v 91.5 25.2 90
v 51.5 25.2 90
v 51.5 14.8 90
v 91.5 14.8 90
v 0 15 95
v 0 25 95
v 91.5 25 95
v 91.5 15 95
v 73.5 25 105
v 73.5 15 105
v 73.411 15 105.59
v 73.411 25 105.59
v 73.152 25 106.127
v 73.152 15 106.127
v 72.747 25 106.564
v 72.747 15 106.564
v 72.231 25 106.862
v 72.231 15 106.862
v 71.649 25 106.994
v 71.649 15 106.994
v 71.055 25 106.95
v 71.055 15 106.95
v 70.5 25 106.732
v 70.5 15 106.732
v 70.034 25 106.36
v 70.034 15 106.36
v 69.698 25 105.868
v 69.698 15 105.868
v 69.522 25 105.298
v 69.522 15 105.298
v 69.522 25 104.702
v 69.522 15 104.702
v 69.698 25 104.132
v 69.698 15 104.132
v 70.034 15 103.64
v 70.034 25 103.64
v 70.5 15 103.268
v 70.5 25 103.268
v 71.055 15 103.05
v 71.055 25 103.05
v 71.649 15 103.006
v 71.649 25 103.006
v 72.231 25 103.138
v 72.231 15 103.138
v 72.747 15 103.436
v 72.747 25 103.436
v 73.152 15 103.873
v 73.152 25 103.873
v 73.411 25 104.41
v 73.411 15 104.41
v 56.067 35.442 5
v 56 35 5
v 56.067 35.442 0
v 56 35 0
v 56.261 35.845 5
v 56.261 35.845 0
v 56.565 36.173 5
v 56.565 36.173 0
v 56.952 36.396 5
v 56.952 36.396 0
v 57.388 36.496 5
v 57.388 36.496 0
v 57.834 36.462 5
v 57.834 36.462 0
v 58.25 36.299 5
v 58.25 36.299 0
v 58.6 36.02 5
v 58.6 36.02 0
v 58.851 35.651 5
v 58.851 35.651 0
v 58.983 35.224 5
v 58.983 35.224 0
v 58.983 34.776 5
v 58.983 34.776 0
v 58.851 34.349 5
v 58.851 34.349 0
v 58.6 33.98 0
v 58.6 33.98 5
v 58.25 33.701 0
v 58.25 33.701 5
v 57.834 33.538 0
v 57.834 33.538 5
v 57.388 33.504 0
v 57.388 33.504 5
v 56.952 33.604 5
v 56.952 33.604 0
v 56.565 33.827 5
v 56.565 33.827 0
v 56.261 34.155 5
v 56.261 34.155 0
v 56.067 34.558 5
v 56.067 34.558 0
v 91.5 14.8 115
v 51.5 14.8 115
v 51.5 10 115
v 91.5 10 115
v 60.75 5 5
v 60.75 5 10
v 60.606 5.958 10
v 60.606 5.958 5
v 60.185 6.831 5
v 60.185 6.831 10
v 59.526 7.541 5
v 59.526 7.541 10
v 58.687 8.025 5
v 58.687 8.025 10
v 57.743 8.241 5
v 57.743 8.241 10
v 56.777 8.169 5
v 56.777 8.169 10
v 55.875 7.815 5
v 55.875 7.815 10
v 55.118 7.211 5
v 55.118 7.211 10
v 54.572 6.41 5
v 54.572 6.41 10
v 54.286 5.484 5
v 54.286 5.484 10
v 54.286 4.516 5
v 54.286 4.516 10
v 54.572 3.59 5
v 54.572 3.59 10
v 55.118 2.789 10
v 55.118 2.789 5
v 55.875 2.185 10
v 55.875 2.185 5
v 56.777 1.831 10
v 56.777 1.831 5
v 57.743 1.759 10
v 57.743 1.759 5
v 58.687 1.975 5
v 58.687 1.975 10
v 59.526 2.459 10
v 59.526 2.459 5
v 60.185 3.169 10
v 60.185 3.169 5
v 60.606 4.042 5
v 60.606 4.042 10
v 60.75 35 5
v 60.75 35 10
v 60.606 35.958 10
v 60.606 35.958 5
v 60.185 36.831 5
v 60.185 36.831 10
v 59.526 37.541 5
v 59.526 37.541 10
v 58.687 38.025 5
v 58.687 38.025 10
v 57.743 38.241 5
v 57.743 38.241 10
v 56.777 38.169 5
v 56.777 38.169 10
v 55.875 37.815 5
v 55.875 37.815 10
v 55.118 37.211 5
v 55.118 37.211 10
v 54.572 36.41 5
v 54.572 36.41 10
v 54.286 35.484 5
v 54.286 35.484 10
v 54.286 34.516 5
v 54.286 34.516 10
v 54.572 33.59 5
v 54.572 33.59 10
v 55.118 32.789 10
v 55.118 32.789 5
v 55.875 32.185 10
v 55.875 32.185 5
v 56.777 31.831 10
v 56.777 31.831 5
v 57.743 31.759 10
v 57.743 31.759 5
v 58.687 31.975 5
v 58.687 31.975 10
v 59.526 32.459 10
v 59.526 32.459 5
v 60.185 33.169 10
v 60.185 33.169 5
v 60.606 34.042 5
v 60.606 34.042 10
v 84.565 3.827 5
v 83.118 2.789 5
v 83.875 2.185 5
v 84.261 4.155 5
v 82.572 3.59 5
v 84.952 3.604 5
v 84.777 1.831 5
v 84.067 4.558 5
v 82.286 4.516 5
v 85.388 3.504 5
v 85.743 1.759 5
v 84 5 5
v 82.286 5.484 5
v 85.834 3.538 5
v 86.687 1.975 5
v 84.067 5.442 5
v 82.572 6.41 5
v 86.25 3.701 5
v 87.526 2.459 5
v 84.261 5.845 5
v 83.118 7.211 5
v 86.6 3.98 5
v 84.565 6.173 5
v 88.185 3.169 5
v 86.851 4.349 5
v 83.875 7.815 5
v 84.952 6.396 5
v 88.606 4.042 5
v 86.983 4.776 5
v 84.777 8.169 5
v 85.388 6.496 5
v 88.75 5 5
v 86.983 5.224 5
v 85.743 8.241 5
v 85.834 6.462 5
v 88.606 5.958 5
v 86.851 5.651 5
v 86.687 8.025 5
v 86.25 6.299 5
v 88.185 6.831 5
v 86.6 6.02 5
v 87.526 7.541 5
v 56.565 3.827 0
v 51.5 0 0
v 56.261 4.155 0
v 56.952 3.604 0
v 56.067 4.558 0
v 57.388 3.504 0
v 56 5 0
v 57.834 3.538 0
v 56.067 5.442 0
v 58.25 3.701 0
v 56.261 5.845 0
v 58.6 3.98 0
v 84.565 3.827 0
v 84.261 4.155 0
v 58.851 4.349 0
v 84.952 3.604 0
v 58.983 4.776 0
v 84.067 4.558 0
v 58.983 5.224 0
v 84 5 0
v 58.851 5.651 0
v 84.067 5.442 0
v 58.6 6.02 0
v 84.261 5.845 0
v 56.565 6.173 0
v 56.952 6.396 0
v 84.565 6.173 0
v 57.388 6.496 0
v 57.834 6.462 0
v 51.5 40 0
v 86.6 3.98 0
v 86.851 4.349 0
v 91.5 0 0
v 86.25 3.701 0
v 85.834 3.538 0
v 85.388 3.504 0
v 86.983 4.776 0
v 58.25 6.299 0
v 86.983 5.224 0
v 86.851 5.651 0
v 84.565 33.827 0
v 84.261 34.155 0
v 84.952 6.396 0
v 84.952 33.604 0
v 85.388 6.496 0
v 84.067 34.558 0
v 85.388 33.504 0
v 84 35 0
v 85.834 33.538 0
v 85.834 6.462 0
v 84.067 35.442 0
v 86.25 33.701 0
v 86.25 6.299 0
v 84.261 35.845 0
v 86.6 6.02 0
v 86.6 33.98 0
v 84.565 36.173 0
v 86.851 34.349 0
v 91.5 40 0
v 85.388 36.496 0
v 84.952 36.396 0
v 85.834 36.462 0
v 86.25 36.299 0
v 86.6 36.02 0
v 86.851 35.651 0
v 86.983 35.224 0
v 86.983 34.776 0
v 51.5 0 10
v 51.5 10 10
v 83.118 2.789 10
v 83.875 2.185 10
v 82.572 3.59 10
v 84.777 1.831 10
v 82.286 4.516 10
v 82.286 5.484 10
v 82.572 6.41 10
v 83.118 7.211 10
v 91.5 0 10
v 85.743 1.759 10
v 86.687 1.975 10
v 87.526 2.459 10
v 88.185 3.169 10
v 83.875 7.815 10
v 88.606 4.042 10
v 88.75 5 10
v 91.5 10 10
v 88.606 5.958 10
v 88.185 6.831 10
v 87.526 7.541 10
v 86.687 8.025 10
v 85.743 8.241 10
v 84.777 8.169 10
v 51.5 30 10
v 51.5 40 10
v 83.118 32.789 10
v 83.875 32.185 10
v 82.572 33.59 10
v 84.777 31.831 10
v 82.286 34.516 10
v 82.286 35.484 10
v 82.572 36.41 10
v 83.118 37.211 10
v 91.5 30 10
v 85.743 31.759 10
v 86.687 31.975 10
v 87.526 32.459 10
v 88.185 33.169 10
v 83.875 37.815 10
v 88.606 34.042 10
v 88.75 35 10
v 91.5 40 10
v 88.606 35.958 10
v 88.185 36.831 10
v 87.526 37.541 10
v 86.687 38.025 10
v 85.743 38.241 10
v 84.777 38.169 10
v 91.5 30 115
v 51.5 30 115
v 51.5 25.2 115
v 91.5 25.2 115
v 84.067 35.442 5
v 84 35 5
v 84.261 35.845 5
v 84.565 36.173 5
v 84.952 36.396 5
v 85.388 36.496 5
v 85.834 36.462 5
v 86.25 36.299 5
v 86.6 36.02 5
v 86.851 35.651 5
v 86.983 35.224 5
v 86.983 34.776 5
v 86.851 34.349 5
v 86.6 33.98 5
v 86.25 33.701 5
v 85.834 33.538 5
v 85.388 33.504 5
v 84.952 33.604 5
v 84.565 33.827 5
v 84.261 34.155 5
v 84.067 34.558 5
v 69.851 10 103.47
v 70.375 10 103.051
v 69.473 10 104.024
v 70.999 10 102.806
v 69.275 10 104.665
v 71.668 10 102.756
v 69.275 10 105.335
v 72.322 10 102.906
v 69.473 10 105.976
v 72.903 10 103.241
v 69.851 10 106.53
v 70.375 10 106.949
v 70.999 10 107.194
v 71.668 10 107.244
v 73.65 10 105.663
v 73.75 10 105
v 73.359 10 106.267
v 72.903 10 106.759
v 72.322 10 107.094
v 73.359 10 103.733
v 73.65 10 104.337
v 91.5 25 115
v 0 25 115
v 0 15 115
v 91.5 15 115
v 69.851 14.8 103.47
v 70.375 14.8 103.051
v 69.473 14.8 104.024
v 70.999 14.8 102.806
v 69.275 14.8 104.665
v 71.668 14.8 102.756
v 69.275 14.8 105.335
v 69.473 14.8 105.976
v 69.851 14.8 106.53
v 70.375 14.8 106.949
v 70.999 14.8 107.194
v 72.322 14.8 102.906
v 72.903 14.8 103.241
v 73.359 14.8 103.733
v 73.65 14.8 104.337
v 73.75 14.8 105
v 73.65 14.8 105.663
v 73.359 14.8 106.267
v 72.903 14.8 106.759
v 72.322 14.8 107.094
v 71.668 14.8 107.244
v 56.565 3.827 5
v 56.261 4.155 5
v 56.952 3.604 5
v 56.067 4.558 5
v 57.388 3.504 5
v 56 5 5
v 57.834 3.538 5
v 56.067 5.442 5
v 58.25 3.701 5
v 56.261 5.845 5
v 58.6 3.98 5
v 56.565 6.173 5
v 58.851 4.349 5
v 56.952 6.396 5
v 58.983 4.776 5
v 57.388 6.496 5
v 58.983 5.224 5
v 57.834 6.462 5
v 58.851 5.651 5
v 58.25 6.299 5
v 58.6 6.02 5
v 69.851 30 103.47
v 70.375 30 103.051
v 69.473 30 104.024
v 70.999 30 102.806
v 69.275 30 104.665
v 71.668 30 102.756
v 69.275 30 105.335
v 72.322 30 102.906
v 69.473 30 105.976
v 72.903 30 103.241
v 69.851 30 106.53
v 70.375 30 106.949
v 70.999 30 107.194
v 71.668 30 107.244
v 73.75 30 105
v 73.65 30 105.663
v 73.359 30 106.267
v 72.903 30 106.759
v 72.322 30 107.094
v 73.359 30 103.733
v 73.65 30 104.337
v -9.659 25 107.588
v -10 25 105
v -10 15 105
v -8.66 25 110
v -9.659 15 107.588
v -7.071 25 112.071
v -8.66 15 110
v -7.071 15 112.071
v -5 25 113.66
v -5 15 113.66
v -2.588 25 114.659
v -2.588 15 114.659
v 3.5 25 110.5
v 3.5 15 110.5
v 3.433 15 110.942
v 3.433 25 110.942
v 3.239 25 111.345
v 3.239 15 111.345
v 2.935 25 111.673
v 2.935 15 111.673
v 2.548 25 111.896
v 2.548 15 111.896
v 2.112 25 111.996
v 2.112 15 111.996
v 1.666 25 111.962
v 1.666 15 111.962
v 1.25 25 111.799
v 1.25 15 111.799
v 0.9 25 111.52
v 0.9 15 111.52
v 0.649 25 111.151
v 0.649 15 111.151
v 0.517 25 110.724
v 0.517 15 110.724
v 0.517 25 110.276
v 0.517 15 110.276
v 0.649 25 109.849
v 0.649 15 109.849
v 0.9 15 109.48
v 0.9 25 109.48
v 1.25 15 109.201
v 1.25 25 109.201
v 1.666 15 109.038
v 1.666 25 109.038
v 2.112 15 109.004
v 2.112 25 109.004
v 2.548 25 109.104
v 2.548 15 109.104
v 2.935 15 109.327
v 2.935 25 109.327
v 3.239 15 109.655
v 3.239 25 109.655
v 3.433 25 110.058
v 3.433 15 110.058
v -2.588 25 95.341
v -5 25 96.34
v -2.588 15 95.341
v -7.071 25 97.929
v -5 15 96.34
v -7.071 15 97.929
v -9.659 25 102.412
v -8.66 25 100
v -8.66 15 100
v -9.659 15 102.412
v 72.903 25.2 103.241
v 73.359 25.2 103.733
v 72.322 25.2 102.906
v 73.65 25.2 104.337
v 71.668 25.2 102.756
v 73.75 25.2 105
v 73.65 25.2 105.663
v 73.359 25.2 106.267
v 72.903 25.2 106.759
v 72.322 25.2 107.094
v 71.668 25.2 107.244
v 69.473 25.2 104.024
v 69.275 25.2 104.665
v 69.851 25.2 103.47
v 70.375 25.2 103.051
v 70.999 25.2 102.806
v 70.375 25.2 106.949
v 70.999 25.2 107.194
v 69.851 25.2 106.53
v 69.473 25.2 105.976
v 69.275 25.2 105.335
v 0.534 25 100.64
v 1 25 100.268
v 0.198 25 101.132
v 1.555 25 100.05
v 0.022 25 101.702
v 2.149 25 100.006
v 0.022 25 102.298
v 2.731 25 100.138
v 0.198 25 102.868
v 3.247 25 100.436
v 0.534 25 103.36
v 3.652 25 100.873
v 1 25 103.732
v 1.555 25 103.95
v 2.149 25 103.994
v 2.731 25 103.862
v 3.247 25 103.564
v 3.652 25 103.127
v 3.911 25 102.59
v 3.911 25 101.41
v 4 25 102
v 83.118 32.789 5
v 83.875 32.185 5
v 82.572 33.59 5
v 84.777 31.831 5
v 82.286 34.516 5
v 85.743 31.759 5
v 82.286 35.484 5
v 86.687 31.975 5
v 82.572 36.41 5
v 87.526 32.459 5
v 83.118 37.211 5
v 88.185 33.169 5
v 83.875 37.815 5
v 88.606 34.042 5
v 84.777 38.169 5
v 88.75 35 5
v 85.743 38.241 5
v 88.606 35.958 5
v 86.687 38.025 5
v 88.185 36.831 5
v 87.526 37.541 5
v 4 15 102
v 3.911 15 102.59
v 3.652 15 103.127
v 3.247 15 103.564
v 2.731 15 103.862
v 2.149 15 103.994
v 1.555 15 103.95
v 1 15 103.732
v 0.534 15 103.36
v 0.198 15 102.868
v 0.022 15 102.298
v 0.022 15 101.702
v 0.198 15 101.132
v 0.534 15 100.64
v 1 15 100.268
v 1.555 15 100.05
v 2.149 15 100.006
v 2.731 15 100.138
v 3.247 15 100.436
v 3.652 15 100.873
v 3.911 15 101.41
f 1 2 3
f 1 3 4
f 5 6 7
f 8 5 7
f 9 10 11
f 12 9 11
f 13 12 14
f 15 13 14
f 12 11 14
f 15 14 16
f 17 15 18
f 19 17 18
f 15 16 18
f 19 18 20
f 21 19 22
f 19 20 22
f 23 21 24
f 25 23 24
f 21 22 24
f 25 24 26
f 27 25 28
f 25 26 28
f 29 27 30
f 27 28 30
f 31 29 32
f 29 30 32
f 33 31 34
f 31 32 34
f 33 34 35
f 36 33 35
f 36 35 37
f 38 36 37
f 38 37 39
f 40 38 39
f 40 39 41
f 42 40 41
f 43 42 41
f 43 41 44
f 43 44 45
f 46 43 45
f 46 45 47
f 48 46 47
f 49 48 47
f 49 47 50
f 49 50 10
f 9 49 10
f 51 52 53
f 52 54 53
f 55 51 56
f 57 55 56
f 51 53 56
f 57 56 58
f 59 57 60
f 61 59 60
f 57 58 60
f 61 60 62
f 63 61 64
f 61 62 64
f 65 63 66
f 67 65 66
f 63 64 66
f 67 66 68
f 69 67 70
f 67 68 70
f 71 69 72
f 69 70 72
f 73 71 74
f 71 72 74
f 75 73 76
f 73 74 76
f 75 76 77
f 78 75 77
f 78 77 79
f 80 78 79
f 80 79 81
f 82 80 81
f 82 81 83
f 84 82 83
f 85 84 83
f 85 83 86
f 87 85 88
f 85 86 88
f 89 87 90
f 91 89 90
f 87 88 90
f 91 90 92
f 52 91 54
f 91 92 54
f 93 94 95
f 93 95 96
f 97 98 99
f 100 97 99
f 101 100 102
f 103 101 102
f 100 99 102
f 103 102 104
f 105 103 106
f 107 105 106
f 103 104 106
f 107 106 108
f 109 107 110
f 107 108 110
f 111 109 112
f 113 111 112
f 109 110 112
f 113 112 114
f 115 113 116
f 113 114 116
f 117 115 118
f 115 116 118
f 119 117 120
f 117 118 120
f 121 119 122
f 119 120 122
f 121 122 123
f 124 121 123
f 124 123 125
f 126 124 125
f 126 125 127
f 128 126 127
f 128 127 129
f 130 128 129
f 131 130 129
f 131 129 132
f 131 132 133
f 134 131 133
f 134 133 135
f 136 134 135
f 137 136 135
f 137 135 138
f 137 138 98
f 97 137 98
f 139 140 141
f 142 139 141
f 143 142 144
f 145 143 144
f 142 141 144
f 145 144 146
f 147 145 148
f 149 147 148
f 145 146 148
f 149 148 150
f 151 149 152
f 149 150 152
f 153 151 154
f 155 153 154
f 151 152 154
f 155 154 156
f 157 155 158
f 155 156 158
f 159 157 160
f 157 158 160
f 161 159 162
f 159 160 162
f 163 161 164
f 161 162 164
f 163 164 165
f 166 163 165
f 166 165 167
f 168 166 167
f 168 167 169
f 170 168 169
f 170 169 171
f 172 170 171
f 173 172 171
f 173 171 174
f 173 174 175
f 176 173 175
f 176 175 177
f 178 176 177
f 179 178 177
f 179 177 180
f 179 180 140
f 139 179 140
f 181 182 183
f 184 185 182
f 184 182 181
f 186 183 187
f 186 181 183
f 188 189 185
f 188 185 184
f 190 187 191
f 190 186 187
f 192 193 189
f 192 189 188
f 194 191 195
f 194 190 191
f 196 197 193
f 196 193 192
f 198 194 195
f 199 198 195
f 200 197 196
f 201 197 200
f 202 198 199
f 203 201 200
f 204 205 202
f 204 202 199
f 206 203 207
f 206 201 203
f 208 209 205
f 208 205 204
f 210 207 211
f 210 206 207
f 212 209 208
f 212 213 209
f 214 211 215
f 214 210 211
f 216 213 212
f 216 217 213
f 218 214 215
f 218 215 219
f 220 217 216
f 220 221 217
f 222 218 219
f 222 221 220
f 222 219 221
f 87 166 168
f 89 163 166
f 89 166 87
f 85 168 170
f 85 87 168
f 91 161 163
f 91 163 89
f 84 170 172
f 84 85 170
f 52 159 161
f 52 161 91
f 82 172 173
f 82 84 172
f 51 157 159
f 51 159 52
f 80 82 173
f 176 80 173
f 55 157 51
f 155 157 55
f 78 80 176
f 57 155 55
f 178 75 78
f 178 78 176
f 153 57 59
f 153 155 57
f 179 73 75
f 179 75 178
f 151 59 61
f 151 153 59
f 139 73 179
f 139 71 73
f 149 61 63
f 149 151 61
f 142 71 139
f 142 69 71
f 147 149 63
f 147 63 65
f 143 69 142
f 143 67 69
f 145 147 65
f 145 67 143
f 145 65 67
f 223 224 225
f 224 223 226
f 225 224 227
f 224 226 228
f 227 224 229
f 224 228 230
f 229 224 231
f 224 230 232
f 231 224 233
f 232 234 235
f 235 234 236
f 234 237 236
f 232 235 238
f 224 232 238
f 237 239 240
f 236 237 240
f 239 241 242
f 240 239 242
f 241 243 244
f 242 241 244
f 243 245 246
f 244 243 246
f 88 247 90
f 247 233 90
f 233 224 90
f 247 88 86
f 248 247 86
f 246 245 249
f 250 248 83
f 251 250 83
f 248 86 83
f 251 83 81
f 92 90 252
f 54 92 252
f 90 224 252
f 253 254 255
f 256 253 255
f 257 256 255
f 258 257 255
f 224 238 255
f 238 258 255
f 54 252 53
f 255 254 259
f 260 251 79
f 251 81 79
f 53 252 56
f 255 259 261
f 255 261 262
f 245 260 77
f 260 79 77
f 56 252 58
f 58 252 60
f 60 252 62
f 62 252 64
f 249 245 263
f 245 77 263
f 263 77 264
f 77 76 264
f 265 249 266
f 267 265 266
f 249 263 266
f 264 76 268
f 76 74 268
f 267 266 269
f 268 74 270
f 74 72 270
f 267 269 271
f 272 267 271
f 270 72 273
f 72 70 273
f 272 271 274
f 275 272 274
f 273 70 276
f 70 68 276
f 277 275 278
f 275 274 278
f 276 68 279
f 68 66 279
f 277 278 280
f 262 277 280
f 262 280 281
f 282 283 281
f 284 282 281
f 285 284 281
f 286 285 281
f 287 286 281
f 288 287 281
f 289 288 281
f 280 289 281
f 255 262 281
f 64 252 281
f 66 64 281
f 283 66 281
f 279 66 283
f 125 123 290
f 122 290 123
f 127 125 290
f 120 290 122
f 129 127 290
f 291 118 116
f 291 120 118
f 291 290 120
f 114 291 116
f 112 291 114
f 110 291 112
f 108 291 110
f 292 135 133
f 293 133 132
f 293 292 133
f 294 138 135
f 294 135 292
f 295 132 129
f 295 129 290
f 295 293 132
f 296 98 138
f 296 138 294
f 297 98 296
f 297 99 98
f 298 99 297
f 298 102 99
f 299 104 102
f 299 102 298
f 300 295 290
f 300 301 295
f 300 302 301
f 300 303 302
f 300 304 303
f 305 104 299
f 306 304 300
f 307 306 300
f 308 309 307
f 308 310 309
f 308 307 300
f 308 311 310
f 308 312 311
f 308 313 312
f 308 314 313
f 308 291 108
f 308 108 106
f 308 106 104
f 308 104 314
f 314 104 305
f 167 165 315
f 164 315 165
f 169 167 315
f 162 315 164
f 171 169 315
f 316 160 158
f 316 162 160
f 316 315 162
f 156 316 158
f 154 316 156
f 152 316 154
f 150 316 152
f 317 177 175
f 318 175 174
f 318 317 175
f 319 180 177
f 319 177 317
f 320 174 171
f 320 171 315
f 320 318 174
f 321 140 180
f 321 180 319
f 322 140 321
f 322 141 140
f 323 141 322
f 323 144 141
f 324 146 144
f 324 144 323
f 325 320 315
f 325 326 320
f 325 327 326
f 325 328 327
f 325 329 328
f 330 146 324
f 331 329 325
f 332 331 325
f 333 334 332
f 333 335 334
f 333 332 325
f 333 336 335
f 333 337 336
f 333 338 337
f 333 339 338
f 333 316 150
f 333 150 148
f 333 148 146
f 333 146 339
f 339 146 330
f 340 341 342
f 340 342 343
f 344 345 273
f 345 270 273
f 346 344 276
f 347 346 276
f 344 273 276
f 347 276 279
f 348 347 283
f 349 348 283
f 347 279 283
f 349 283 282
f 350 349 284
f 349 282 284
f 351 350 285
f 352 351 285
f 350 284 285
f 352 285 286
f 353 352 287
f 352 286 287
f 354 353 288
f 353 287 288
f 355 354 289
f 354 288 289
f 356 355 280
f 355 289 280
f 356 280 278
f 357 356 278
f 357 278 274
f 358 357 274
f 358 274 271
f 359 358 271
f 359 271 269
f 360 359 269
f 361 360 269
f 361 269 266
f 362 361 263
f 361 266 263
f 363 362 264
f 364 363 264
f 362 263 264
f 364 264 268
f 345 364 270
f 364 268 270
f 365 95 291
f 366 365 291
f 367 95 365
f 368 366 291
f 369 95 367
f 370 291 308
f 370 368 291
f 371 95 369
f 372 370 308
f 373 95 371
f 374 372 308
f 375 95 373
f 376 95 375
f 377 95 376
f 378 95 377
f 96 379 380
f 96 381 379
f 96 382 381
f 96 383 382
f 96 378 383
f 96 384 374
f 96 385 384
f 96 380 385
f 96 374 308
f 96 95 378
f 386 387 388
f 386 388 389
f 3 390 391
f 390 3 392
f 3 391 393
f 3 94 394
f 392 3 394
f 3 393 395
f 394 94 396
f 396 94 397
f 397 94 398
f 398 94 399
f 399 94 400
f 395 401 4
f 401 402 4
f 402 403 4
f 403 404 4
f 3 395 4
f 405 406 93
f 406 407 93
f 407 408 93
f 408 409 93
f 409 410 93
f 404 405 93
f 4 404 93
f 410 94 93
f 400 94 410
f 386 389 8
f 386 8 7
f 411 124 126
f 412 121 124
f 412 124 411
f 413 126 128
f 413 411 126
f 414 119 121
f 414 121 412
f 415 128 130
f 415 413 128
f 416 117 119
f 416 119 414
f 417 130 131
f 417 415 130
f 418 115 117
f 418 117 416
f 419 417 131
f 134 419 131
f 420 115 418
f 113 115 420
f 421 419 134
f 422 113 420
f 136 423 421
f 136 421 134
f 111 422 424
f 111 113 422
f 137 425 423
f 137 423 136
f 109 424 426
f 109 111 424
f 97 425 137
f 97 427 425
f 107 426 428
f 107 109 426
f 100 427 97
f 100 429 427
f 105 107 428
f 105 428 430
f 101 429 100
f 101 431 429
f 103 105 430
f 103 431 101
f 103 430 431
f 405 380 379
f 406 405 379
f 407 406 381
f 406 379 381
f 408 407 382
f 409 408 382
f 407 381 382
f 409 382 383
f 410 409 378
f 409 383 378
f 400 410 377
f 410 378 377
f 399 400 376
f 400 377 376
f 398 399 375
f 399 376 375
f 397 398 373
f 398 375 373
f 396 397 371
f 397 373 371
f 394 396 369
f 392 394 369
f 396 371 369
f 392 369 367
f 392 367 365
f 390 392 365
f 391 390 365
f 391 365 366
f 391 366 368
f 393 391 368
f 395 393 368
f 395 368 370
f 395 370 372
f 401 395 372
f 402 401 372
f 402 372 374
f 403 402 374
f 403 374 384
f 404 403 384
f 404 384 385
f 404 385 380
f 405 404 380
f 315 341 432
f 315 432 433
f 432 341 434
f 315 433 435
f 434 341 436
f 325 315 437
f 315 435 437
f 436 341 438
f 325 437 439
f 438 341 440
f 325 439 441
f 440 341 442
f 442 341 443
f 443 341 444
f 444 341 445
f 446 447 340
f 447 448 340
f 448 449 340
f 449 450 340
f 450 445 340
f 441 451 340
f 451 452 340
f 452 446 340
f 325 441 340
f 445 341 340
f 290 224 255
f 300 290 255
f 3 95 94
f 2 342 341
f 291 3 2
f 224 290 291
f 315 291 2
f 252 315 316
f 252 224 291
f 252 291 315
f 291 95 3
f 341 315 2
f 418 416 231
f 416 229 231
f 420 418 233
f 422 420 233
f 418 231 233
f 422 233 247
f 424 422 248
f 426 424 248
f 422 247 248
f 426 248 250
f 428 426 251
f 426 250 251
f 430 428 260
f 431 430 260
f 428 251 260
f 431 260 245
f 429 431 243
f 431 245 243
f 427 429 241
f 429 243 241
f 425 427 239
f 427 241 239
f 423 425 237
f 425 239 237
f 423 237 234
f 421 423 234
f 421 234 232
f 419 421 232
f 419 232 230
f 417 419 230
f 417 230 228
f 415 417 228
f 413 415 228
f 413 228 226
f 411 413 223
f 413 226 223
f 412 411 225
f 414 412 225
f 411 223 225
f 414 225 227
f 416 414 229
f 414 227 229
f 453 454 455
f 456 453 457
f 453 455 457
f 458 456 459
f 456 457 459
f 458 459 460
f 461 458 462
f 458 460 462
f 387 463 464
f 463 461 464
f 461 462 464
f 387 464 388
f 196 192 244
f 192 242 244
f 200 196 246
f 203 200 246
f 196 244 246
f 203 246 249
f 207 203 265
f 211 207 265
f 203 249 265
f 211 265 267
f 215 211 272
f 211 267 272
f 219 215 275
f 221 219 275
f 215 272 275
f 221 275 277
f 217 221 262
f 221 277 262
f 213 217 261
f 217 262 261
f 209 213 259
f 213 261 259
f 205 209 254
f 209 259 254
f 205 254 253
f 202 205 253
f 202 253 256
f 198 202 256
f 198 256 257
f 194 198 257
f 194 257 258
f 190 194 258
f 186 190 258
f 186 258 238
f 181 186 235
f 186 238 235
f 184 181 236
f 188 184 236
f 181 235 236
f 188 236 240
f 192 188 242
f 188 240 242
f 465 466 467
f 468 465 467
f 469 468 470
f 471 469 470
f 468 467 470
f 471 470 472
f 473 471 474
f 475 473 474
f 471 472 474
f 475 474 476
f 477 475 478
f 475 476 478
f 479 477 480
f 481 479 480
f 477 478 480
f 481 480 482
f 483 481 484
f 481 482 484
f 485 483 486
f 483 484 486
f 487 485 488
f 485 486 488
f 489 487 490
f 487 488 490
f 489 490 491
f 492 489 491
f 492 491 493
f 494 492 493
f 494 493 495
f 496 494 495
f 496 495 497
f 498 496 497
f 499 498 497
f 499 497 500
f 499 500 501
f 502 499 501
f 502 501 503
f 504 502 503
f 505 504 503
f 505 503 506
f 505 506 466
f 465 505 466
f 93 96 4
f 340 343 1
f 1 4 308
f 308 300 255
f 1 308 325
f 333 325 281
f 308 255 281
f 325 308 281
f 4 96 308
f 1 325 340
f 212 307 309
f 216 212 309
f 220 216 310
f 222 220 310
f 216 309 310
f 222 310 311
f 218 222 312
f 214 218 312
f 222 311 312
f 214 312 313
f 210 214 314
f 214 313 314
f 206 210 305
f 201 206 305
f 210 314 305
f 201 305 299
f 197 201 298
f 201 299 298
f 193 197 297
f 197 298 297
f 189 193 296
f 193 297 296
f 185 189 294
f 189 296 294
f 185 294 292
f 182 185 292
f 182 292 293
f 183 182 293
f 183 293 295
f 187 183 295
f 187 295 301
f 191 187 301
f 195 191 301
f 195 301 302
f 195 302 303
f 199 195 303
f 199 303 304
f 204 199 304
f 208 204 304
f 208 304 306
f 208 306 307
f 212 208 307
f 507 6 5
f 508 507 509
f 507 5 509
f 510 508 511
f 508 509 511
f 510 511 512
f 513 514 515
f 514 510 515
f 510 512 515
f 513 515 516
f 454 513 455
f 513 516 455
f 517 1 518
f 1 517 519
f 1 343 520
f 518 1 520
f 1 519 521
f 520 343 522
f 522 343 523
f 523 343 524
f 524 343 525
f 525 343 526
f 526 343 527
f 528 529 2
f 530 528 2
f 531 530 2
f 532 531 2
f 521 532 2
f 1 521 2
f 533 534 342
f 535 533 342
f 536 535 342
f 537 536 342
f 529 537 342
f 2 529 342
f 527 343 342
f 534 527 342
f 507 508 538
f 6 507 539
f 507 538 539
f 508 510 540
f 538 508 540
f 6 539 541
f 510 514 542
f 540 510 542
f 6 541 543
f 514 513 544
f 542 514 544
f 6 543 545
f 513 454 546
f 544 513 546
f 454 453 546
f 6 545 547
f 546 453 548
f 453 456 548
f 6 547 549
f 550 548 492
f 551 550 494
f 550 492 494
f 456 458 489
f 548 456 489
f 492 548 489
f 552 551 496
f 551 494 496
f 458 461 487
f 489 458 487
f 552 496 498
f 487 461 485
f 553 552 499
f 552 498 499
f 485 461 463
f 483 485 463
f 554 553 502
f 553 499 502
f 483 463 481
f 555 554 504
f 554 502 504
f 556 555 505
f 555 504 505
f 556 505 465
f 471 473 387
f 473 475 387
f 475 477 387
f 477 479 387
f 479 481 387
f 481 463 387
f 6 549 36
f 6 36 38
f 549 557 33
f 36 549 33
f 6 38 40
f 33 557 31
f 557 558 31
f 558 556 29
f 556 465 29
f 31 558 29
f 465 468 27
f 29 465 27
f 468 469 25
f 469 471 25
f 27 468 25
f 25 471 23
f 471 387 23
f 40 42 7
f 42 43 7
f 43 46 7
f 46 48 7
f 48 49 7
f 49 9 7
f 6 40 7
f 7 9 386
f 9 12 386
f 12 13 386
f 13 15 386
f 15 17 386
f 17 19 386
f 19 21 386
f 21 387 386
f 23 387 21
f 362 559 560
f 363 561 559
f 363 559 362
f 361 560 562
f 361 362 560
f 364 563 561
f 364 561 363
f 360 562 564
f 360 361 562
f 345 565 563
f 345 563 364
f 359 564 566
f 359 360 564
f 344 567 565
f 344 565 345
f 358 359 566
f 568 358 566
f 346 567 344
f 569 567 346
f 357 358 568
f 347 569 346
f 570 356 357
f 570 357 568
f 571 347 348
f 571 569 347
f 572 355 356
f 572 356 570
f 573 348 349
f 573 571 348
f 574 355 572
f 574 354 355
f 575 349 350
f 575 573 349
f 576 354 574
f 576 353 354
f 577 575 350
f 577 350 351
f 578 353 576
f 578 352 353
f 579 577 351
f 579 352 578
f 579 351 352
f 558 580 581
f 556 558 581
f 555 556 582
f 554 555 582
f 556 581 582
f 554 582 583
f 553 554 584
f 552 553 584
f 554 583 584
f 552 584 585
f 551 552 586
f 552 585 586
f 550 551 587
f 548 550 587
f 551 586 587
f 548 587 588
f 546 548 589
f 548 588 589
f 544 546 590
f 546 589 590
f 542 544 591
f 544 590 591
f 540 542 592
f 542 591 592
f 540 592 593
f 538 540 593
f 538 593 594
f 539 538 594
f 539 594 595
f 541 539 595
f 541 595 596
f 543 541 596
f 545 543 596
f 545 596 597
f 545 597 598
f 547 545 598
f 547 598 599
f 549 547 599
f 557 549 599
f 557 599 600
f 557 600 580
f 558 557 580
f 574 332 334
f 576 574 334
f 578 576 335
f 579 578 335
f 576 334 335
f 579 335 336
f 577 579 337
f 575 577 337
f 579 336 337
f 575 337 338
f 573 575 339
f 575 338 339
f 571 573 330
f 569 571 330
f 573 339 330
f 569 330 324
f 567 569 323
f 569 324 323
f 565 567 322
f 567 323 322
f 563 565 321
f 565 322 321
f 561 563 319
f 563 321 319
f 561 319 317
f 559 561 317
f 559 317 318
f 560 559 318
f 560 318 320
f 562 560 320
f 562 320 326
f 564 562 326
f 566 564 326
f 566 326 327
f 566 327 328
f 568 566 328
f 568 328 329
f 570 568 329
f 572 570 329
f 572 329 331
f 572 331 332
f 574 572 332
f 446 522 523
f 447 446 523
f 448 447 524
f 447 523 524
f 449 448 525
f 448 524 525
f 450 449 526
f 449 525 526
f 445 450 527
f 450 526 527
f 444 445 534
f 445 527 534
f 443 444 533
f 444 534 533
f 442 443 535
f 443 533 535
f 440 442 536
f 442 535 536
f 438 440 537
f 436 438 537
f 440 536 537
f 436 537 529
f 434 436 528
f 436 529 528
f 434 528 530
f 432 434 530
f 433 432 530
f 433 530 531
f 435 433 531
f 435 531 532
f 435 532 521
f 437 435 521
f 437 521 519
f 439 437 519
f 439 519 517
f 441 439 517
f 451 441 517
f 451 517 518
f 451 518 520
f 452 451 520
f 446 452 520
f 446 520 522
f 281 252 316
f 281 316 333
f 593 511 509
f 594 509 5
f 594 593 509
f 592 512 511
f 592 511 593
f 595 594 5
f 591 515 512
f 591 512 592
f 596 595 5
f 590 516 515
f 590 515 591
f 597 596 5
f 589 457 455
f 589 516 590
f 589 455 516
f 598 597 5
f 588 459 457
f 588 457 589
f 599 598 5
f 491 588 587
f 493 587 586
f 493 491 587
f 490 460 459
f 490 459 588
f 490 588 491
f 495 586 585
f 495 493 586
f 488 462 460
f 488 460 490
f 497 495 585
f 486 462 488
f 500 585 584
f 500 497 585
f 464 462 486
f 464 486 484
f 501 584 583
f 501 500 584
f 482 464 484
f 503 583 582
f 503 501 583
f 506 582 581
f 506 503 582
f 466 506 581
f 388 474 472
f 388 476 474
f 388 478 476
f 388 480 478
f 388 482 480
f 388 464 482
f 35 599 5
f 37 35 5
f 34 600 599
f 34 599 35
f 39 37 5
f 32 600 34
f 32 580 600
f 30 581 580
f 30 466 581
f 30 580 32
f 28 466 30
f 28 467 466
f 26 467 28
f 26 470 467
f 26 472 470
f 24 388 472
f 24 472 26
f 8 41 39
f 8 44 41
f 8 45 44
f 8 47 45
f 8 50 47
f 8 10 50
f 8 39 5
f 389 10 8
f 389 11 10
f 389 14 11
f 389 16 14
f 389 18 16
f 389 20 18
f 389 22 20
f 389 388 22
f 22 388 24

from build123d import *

# Parameters (mm, degrees)
F0_W           = 40
F0_H           = 40
F1_DEPTH       = 115
F2_W           = 40
F2_H           = 10
F3_DEPTH       = 105
F5_D           = 3
F5_DEPTH       = 10.7
F5_CBORE_D     = 6.5
F5_CBORE_DEPTH = 5
F5_TIP         = 0.9012909285
F7_DEPTH       = 25
F8_R           = 2.25
F9_DEPTH       = 30.001
F11_W          = 101.5
F11_H          = 10
F12_DEPTH      = 10
F13_R          = 2
F13_R_2        = 1.5
F14_DEPTH      = 25.001


with BuildPart() as f1:
    # F0 (on Top) → F1 (new body)
    with BuildSketch(Plane.XY):
        with Locations((71.5, 20)):
            Rectangle(F0_W, F0_H)
    extrude(amount=F1_DEPTH)

    # F2 (on face) → F3 (cut)
    with BuildSketch(Plane.XY.offset(115)):
        with Locations((71.5, 5)):
            Rectangle(F2_W, F2_H)
        with Locations((71.5, 35)):
            Rectangle(F2_W, F2_H)
    extrude(amount=-F3_DEPTH, mode=Mode.SUBTRACT)

    # F5
    with Locations(Plane.XY.offset(10)):
        with Locations((57.5, 5), (85.5, 5), (85.5, 35), (57.5, 35)):
            CounterBoreHole(F5_D / 2, F5_CBORE_D / 2, F5_CBORE_DEPTH, depth=F5_DEPTH)
            with Locations((0, 0, -(F5_DEPTH + F5_TIP / 2))):  # 118° drill point
                Cone(0, F5_D / 2, F5_TIP, mode=Mode.SUBTRACT)

    # F6 (on face) → F7 (cut)
    with BuildSketch(Plane.XY.offset(115)):
        Polygon((51.5, 25.2), (51.5, 20), (51.5, 14.8), (91.5, 14.8), (91.5, 20), (91.5, 25.2), align=None)
    extrude(amount=-F7_DEPTH, mode=Mode.SUBTRACT)

    # F8 (on face) → F9 (cut, through all)
    with BuildSketch(Plane.XZ.offset(-10)):
        with Locations((71.5, 105)):
            Circle(F8_R)
    extrude(amount=-F9_DEPTH, mode=Mode.SUBTRACT)


with BuildPart() as f12:
    # F11 (on offset) → F12 (new body, symmetric)
    with BuildSketch(Plane.XY.offset(105)):
        with Locations((40.75, 20)):
            Rectangle(F11_W, F11_H)
    extrude(amount=F12_DEPTH, both=True)

    # F13 (on face) → F14 (cut, through all)
    with BuildSketch(Plane.XZ.offset(-15)):
        with Locations((71.5, 104.9999967217)):
            Circle(F13_R)
        with Locations((2, 102)):
            Circle(F13_R)
        with Locations((2, 110.5)):
            Circle(F13_R_2)
        with BuildLine():
            ThreePointArc((0, 95), (-7.0710678119, 97.9289321881), (-10, 105))
            Line((-10, 105), (-10, 95))
            Line((-10, 95), (0, 95))
        make_face()
        with BuildLine():
            ThreePointArc((-10, 105), (-7.0710678119, 112.0710678119), (0, 115))
            Line((0, 115), (-10, 115))
            Line((-10, 115), (-10, 105))
        make_face()
    extrude(amount=-F14_DEPTH, mode=Mode.SUBTRACT)


solid = Compound([f1.part, f12.part])
